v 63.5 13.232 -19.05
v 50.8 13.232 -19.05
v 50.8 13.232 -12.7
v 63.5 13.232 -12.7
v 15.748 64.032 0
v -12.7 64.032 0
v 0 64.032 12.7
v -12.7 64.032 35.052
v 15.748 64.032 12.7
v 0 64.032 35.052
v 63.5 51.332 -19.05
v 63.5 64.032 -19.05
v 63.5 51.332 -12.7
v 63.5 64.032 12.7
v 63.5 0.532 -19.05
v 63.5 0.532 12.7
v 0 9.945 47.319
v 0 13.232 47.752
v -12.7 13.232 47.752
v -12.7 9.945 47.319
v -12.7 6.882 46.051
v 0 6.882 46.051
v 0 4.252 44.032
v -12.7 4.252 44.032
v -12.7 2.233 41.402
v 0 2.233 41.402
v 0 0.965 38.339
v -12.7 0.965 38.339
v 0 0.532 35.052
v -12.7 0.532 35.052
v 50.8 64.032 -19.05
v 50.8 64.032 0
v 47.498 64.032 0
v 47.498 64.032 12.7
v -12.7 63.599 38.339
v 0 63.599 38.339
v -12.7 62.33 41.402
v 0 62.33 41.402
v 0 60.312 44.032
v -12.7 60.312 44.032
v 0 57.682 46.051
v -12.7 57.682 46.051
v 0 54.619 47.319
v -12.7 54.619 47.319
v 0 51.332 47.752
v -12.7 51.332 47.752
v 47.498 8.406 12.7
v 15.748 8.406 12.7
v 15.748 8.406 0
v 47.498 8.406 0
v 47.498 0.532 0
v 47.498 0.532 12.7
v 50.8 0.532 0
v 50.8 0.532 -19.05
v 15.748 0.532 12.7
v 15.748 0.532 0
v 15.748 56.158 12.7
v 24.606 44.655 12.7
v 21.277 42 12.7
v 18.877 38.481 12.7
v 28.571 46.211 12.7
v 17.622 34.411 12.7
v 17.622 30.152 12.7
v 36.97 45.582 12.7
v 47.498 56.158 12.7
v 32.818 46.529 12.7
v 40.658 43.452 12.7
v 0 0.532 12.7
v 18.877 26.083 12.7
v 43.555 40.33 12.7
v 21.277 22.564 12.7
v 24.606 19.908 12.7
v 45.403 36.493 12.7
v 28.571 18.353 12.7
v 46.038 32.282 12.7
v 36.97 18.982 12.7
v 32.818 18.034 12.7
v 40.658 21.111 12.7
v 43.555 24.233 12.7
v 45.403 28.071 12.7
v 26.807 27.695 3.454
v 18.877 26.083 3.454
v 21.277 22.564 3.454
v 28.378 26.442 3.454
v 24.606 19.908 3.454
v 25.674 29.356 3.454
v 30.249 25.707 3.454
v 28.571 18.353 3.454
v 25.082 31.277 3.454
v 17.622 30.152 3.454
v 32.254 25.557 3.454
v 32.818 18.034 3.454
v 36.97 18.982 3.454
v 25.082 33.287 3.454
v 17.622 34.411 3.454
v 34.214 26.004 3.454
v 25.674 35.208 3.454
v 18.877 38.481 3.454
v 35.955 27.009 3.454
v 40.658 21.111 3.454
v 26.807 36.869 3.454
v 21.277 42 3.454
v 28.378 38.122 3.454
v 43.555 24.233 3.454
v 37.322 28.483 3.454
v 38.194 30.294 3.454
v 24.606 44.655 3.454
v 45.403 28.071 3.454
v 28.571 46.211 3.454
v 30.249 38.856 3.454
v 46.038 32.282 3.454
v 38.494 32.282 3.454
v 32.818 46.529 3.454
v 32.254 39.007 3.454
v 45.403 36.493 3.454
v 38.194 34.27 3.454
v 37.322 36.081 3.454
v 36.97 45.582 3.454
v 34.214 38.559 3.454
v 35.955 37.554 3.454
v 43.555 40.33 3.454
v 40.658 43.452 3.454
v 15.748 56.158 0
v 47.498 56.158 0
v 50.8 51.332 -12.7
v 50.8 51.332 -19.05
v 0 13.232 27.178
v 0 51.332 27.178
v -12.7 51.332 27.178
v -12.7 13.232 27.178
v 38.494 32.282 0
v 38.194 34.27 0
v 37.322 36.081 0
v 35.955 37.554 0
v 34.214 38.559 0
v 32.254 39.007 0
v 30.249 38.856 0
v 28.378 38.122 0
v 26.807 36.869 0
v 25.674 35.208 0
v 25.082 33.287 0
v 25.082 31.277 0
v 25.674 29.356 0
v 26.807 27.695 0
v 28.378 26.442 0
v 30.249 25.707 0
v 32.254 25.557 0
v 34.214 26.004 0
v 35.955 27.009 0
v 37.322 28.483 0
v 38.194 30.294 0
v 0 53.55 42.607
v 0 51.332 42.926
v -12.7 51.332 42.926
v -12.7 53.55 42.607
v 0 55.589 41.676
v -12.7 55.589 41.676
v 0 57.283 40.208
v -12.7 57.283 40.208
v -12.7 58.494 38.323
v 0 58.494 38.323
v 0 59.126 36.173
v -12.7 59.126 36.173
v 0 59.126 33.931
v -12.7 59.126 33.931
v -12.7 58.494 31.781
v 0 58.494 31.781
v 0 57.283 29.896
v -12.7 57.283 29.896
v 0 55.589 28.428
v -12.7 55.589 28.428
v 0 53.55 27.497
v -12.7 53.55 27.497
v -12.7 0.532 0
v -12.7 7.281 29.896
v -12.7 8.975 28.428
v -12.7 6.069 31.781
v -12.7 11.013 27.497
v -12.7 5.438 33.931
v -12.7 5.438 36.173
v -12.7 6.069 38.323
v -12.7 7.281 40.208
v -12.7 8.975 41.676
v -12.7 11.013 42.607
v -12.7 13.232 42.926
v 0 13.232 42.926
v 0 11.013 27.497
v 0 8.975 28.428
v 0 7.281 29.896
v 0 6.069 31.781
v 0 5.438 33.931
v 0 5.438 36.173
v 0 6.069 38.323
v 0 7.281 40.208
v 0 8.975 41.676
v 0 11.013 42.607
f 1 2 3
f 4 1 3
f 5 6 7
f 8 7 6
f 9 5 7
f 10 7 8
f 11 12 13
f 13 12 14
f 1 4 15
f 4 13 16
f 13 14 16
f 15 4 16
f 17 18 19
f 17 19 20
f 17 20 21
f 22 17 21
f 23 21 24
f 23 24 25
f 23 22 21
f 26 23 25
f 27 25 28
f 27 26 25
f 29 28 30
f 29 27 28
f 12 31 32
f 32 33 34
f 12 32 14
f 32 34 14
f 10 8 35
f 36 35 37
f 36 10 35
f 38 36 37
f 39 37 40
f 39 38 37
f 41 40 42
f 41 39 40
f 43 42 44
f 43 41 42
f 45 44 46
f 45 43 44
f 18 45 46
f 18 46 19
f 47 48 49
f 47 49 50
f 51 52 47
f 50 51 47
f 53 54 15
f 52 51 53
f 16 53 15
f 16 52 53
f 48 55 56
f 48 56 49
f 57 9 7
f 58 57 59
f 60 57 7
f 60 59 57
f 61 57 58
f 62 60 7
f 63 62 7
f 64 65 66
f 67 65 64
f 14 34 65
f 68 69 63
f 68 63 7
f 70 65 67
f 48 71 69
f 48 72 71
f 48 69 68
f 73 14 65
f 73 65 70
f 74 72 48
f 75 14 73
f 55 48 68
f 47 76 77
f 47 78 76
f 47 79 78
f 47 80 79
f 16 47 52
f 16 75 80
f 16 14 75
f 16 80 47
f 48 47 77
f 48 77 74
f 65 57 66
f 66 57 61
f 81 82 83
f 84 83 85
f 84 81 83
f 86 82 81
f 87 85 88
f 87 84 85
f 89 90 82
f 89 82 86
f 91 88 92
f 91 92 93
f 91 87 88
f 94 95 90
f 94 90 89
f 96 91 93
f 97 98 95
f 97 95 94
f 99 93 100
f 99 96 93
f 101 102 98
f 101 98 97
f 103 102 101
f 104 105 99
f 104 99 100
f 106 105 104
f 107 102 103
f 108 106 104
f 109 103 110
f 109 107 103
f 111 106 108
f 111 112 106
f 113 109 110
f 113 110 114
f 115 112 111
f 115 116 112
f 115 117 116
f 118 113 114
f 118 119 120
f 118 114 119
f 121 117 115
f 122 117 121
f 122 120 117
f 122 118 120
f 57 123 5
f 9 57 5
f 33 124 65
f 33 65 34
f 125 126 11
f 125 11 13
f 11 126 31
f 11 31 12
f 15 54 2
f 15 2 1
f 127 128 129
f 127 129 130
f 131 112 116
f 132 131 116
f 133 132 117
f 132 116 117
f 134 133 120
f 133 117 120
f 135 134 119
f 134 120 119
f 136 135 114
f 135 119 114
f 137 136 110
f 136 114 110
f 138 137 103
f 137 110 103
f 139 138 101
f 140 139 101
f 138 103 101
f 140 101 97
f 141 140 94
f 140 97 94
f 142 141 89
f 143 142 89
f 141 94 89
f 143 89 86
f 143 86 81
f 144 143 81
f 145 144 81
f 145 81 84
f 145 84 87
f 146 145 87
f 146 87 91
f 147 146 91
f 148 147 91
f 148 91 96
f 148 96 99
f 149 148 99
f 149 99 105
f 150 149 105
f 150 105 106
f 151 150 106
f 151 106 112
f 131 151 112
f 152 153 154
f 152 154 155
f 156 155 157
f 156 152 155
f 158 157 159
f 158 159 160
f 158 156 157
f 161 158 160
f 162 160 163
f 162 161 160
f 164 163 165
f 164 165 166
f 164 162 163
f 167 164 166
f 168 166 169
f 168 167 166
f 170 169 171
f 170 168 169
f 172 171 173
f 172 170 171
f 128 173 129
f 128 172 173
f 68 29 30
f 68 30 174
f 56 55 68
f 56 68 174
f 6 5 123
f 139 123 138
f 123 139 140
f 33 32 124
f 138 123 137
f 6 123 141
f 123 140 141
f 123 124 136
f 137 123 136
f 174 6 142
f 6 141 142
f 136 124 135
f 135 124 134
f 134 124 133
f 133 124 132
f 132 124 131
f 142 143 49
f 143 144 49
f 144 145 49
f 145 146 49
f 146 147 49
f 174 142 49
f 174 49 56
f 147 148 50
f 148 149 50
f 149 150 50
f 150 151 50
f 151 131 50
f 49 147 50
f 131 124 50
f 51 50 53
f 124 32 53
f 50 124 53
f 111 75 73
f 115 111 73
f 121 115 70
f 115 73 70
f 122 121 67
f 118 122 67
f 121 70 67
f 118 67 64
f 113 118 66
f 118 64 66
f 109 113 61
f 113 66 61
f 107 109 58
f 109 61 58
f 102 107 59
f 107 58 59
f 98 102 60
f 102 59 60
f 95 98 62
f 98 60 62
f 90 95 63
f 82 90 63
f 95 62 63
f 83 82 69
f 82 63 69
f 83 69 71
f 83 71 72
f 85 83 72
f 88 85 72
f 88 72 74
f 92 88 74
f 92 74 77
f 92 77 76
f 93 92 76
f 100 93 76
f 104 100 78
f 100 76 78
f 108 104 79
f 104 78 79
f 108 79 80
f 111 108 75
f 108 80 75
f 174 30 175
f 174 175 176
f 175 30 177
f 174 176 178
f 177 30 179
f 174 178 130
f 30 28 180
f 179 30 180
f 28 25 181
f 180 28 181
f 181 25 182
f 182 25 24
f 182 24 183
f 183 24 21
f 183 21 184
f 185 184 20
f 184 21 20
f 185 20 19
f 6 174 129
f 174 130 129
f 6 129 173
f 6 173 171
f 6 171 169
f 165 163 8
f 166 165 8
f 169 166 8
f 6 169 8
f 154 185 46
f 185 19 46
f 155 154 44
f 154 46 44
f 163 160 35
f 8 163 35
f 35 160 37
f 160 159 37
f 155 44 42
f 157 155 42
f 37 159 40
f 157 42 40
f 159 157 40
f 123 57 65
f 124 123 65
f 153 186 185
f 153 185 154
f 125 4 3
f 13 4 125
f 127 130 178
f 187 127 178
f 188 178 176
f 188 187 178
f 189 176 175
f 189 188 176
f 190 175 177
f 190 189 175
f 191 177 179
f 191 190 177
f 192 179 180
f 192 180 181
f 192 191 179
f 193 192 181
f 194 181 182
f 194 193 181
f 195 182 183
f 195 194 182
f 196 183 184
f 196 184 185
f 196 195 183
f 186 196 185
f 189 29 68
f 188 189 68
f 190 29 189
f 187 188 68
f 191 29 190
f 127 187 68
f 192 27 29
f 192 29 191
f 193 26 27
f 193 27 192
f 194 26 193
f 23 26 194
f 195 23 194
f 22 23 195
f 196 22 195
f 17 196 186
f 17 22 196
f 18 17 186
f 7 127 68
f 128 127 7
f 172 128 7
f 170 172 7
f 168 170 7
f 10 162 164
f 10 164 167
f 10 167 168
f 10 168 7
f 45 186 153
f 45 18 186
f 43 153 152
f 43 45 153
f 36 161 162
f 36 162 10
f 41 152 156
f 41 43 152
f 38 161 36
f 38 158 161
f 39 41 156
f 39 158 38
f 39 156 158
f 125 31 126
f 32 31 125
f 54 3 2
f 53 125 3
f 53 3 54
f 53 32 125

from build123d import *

# Parameters (mm, degrees)
F0_W      = 63.5
F0_H      = 63.5
F1_DEPTH  = 12.7
F3_W      = 63.5
F3_H      = 12.7
F4_DEPTH  = 12.7
F5_DEPTH  = 12.7
F6_W      = 31.75
F6_H      = 7.874
F7_DEPTH  = 12.701
F8_W      = 12.7
F8_H      = 63.5
F9_DEPTH  = 19.05
F10_W     = 38.1
F10_H     = 6.35
F11_DEPTH = 25.4
F12_R     = 6.7437
F13_DEPTH = 31.751
F14_R     = 14.2875
F15_DEPTH = 9.2456


with BuildPart() as f1:
    # F0 (on Top) → F1 (new body)
    with BuildSketch(Plane.XY):
        with Locations((31.75, 32.281832)):
            Rectangle(F0_W, F0_H)
    extrude(amount=F1_DEPTH)

    # F3 (on face) → F4 (join)
    with BuildSketch(Plane(origin=(0, 0, 0), x_dir=(0, -1, 0), z_dir=(-1, 0, 0))):
        with Locations((-32.281832, 6.35)):
            Rectangle(F3_W, F3_H)
    extrude(amount=F4_DEPTH)

    # F2 (on Right) → F5 (join)
    with BuildSketch(Plane.YZ):
        with BuildLine():
            Line((51.331832, 47.752), (13.231832, 47.752))
            ThreePointArc((13.231832, 47.752), (4.251576, 44.032256), (0.531832, 35.052))
            Line((0.531832, 35.052), (0.531832, 12.7))
            Line((0.531832, 12.7), (64.031832, 12.7))
            Line((64.031832, 12.7), (64.031832, 35.052))
            ThreePointArc((64.031832, 35.052), (60.312088, 44.032256), (51.331832, 47.752))
        make_face()
        with BuildLine():
            ThreePointArc((13.231832, 27.178), (5.357832, 35.052), (13.231832, 42.926))
            Line((13.231832, 42.926), (51.331832, 42.926))
            ThreePointArc((51.331832, 42.926), (59.205832, 35.052), (51.331832, 27.178))
            Line((51.331832, 27.178), (13.231832, 27.178))
        make_face(mode=Mode.SUBTRACT)
    extrude(amount=-F5_DEPTH)

    # F6 (on face) → F7 (cut, through all)
    with BuildSketch(Plane.XY.offset(12.7)):
        with Locations((31.623, 4.468832)):
            Rectangle(F6_W, F6_H)
        with Locations((31.623, 60.094832)):
            Rectangle(F6_W, F6_H)
    extrude(amount=-F7_DEPTH, mode=Mode.SUBTRACT)

    # F8 (on face) → F9 (join)
    with BuildSketch(Plane(origin=(0, 0, 0), x_dir=(1, 0, 0), z_dir=(0, 0, -1))):
        with Locations((57.15, -32.281832)):
            Rectangle(F8_W, F8_H)
    extrude(amount=F9_DEPTH)

    # F10 (on face) → F11 (cut)
    with BuildSketch(Plane.YZ.offset(63.5)):
        with Locations((32.281832, -15.875)):
            Rectangle(F10_W, F10_H)
    extrude(amount=-F11_DEPTH, mode=Mode.SUBTRACT)

    # F12 (on face) → F13 (cut, through all)
    with BuildSketch(Plane.XY.offset(12.7)):
        with Locations((31.75, 32.281832)):
            Circle(F12_R)
    extrude(amount=-F13_DEPTH, mode=Mode.SUBTRACT)

    # F14 (on face) → F15 (cut)
    with BuildSketch(Plane.XY.offset(12.7)):
        with Locations((31.75, 32.281832)):
            Circle(F14_R)
    extrude(amount=-F15_DEPTH, mode=Mode.SUBTRACT)


solid = f1.part
